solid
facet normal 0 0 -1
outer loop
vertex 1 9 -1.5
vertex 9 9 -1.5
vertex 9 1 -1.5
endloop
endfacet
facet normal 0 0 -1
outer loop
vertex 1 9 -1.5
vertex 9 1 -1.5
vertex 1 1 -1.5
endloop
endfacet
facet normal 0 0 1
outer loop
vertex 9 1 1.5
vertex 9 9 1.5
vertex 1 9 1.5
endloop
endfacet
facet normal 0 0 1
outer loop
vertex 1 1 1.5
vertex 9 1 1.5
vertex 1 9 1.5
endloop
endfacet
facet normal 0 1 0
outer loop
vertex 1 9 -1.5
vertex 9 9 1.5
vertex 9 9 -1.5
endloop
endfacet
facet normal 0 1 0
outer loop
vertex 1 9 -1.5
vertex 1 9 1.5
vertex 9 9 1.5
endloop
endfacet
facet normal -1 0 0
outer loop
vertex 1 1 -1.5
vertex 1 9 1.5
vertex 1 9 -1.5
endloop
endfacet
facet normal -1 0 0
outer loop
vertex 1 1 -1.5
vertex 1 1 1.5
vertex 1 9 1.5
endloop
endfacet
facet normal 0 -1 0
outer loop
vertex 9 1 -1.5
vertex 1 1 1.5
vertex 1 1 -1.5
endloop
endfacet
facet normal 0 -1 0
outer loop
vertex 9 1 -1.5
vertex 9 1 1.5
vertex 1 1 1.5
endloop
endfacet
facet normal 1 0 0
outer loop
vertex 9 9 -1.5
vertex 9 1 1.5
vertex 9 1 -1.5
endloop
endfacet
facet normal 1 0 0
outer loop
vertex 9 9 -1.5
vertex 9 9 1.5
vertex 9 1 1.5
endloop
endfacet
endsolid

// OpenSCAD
// 3. 缩小的正方形拉伸
linear_extrude(height = 3, center = true) {
    offset(r = -1) {
        square(10);
    }
}
